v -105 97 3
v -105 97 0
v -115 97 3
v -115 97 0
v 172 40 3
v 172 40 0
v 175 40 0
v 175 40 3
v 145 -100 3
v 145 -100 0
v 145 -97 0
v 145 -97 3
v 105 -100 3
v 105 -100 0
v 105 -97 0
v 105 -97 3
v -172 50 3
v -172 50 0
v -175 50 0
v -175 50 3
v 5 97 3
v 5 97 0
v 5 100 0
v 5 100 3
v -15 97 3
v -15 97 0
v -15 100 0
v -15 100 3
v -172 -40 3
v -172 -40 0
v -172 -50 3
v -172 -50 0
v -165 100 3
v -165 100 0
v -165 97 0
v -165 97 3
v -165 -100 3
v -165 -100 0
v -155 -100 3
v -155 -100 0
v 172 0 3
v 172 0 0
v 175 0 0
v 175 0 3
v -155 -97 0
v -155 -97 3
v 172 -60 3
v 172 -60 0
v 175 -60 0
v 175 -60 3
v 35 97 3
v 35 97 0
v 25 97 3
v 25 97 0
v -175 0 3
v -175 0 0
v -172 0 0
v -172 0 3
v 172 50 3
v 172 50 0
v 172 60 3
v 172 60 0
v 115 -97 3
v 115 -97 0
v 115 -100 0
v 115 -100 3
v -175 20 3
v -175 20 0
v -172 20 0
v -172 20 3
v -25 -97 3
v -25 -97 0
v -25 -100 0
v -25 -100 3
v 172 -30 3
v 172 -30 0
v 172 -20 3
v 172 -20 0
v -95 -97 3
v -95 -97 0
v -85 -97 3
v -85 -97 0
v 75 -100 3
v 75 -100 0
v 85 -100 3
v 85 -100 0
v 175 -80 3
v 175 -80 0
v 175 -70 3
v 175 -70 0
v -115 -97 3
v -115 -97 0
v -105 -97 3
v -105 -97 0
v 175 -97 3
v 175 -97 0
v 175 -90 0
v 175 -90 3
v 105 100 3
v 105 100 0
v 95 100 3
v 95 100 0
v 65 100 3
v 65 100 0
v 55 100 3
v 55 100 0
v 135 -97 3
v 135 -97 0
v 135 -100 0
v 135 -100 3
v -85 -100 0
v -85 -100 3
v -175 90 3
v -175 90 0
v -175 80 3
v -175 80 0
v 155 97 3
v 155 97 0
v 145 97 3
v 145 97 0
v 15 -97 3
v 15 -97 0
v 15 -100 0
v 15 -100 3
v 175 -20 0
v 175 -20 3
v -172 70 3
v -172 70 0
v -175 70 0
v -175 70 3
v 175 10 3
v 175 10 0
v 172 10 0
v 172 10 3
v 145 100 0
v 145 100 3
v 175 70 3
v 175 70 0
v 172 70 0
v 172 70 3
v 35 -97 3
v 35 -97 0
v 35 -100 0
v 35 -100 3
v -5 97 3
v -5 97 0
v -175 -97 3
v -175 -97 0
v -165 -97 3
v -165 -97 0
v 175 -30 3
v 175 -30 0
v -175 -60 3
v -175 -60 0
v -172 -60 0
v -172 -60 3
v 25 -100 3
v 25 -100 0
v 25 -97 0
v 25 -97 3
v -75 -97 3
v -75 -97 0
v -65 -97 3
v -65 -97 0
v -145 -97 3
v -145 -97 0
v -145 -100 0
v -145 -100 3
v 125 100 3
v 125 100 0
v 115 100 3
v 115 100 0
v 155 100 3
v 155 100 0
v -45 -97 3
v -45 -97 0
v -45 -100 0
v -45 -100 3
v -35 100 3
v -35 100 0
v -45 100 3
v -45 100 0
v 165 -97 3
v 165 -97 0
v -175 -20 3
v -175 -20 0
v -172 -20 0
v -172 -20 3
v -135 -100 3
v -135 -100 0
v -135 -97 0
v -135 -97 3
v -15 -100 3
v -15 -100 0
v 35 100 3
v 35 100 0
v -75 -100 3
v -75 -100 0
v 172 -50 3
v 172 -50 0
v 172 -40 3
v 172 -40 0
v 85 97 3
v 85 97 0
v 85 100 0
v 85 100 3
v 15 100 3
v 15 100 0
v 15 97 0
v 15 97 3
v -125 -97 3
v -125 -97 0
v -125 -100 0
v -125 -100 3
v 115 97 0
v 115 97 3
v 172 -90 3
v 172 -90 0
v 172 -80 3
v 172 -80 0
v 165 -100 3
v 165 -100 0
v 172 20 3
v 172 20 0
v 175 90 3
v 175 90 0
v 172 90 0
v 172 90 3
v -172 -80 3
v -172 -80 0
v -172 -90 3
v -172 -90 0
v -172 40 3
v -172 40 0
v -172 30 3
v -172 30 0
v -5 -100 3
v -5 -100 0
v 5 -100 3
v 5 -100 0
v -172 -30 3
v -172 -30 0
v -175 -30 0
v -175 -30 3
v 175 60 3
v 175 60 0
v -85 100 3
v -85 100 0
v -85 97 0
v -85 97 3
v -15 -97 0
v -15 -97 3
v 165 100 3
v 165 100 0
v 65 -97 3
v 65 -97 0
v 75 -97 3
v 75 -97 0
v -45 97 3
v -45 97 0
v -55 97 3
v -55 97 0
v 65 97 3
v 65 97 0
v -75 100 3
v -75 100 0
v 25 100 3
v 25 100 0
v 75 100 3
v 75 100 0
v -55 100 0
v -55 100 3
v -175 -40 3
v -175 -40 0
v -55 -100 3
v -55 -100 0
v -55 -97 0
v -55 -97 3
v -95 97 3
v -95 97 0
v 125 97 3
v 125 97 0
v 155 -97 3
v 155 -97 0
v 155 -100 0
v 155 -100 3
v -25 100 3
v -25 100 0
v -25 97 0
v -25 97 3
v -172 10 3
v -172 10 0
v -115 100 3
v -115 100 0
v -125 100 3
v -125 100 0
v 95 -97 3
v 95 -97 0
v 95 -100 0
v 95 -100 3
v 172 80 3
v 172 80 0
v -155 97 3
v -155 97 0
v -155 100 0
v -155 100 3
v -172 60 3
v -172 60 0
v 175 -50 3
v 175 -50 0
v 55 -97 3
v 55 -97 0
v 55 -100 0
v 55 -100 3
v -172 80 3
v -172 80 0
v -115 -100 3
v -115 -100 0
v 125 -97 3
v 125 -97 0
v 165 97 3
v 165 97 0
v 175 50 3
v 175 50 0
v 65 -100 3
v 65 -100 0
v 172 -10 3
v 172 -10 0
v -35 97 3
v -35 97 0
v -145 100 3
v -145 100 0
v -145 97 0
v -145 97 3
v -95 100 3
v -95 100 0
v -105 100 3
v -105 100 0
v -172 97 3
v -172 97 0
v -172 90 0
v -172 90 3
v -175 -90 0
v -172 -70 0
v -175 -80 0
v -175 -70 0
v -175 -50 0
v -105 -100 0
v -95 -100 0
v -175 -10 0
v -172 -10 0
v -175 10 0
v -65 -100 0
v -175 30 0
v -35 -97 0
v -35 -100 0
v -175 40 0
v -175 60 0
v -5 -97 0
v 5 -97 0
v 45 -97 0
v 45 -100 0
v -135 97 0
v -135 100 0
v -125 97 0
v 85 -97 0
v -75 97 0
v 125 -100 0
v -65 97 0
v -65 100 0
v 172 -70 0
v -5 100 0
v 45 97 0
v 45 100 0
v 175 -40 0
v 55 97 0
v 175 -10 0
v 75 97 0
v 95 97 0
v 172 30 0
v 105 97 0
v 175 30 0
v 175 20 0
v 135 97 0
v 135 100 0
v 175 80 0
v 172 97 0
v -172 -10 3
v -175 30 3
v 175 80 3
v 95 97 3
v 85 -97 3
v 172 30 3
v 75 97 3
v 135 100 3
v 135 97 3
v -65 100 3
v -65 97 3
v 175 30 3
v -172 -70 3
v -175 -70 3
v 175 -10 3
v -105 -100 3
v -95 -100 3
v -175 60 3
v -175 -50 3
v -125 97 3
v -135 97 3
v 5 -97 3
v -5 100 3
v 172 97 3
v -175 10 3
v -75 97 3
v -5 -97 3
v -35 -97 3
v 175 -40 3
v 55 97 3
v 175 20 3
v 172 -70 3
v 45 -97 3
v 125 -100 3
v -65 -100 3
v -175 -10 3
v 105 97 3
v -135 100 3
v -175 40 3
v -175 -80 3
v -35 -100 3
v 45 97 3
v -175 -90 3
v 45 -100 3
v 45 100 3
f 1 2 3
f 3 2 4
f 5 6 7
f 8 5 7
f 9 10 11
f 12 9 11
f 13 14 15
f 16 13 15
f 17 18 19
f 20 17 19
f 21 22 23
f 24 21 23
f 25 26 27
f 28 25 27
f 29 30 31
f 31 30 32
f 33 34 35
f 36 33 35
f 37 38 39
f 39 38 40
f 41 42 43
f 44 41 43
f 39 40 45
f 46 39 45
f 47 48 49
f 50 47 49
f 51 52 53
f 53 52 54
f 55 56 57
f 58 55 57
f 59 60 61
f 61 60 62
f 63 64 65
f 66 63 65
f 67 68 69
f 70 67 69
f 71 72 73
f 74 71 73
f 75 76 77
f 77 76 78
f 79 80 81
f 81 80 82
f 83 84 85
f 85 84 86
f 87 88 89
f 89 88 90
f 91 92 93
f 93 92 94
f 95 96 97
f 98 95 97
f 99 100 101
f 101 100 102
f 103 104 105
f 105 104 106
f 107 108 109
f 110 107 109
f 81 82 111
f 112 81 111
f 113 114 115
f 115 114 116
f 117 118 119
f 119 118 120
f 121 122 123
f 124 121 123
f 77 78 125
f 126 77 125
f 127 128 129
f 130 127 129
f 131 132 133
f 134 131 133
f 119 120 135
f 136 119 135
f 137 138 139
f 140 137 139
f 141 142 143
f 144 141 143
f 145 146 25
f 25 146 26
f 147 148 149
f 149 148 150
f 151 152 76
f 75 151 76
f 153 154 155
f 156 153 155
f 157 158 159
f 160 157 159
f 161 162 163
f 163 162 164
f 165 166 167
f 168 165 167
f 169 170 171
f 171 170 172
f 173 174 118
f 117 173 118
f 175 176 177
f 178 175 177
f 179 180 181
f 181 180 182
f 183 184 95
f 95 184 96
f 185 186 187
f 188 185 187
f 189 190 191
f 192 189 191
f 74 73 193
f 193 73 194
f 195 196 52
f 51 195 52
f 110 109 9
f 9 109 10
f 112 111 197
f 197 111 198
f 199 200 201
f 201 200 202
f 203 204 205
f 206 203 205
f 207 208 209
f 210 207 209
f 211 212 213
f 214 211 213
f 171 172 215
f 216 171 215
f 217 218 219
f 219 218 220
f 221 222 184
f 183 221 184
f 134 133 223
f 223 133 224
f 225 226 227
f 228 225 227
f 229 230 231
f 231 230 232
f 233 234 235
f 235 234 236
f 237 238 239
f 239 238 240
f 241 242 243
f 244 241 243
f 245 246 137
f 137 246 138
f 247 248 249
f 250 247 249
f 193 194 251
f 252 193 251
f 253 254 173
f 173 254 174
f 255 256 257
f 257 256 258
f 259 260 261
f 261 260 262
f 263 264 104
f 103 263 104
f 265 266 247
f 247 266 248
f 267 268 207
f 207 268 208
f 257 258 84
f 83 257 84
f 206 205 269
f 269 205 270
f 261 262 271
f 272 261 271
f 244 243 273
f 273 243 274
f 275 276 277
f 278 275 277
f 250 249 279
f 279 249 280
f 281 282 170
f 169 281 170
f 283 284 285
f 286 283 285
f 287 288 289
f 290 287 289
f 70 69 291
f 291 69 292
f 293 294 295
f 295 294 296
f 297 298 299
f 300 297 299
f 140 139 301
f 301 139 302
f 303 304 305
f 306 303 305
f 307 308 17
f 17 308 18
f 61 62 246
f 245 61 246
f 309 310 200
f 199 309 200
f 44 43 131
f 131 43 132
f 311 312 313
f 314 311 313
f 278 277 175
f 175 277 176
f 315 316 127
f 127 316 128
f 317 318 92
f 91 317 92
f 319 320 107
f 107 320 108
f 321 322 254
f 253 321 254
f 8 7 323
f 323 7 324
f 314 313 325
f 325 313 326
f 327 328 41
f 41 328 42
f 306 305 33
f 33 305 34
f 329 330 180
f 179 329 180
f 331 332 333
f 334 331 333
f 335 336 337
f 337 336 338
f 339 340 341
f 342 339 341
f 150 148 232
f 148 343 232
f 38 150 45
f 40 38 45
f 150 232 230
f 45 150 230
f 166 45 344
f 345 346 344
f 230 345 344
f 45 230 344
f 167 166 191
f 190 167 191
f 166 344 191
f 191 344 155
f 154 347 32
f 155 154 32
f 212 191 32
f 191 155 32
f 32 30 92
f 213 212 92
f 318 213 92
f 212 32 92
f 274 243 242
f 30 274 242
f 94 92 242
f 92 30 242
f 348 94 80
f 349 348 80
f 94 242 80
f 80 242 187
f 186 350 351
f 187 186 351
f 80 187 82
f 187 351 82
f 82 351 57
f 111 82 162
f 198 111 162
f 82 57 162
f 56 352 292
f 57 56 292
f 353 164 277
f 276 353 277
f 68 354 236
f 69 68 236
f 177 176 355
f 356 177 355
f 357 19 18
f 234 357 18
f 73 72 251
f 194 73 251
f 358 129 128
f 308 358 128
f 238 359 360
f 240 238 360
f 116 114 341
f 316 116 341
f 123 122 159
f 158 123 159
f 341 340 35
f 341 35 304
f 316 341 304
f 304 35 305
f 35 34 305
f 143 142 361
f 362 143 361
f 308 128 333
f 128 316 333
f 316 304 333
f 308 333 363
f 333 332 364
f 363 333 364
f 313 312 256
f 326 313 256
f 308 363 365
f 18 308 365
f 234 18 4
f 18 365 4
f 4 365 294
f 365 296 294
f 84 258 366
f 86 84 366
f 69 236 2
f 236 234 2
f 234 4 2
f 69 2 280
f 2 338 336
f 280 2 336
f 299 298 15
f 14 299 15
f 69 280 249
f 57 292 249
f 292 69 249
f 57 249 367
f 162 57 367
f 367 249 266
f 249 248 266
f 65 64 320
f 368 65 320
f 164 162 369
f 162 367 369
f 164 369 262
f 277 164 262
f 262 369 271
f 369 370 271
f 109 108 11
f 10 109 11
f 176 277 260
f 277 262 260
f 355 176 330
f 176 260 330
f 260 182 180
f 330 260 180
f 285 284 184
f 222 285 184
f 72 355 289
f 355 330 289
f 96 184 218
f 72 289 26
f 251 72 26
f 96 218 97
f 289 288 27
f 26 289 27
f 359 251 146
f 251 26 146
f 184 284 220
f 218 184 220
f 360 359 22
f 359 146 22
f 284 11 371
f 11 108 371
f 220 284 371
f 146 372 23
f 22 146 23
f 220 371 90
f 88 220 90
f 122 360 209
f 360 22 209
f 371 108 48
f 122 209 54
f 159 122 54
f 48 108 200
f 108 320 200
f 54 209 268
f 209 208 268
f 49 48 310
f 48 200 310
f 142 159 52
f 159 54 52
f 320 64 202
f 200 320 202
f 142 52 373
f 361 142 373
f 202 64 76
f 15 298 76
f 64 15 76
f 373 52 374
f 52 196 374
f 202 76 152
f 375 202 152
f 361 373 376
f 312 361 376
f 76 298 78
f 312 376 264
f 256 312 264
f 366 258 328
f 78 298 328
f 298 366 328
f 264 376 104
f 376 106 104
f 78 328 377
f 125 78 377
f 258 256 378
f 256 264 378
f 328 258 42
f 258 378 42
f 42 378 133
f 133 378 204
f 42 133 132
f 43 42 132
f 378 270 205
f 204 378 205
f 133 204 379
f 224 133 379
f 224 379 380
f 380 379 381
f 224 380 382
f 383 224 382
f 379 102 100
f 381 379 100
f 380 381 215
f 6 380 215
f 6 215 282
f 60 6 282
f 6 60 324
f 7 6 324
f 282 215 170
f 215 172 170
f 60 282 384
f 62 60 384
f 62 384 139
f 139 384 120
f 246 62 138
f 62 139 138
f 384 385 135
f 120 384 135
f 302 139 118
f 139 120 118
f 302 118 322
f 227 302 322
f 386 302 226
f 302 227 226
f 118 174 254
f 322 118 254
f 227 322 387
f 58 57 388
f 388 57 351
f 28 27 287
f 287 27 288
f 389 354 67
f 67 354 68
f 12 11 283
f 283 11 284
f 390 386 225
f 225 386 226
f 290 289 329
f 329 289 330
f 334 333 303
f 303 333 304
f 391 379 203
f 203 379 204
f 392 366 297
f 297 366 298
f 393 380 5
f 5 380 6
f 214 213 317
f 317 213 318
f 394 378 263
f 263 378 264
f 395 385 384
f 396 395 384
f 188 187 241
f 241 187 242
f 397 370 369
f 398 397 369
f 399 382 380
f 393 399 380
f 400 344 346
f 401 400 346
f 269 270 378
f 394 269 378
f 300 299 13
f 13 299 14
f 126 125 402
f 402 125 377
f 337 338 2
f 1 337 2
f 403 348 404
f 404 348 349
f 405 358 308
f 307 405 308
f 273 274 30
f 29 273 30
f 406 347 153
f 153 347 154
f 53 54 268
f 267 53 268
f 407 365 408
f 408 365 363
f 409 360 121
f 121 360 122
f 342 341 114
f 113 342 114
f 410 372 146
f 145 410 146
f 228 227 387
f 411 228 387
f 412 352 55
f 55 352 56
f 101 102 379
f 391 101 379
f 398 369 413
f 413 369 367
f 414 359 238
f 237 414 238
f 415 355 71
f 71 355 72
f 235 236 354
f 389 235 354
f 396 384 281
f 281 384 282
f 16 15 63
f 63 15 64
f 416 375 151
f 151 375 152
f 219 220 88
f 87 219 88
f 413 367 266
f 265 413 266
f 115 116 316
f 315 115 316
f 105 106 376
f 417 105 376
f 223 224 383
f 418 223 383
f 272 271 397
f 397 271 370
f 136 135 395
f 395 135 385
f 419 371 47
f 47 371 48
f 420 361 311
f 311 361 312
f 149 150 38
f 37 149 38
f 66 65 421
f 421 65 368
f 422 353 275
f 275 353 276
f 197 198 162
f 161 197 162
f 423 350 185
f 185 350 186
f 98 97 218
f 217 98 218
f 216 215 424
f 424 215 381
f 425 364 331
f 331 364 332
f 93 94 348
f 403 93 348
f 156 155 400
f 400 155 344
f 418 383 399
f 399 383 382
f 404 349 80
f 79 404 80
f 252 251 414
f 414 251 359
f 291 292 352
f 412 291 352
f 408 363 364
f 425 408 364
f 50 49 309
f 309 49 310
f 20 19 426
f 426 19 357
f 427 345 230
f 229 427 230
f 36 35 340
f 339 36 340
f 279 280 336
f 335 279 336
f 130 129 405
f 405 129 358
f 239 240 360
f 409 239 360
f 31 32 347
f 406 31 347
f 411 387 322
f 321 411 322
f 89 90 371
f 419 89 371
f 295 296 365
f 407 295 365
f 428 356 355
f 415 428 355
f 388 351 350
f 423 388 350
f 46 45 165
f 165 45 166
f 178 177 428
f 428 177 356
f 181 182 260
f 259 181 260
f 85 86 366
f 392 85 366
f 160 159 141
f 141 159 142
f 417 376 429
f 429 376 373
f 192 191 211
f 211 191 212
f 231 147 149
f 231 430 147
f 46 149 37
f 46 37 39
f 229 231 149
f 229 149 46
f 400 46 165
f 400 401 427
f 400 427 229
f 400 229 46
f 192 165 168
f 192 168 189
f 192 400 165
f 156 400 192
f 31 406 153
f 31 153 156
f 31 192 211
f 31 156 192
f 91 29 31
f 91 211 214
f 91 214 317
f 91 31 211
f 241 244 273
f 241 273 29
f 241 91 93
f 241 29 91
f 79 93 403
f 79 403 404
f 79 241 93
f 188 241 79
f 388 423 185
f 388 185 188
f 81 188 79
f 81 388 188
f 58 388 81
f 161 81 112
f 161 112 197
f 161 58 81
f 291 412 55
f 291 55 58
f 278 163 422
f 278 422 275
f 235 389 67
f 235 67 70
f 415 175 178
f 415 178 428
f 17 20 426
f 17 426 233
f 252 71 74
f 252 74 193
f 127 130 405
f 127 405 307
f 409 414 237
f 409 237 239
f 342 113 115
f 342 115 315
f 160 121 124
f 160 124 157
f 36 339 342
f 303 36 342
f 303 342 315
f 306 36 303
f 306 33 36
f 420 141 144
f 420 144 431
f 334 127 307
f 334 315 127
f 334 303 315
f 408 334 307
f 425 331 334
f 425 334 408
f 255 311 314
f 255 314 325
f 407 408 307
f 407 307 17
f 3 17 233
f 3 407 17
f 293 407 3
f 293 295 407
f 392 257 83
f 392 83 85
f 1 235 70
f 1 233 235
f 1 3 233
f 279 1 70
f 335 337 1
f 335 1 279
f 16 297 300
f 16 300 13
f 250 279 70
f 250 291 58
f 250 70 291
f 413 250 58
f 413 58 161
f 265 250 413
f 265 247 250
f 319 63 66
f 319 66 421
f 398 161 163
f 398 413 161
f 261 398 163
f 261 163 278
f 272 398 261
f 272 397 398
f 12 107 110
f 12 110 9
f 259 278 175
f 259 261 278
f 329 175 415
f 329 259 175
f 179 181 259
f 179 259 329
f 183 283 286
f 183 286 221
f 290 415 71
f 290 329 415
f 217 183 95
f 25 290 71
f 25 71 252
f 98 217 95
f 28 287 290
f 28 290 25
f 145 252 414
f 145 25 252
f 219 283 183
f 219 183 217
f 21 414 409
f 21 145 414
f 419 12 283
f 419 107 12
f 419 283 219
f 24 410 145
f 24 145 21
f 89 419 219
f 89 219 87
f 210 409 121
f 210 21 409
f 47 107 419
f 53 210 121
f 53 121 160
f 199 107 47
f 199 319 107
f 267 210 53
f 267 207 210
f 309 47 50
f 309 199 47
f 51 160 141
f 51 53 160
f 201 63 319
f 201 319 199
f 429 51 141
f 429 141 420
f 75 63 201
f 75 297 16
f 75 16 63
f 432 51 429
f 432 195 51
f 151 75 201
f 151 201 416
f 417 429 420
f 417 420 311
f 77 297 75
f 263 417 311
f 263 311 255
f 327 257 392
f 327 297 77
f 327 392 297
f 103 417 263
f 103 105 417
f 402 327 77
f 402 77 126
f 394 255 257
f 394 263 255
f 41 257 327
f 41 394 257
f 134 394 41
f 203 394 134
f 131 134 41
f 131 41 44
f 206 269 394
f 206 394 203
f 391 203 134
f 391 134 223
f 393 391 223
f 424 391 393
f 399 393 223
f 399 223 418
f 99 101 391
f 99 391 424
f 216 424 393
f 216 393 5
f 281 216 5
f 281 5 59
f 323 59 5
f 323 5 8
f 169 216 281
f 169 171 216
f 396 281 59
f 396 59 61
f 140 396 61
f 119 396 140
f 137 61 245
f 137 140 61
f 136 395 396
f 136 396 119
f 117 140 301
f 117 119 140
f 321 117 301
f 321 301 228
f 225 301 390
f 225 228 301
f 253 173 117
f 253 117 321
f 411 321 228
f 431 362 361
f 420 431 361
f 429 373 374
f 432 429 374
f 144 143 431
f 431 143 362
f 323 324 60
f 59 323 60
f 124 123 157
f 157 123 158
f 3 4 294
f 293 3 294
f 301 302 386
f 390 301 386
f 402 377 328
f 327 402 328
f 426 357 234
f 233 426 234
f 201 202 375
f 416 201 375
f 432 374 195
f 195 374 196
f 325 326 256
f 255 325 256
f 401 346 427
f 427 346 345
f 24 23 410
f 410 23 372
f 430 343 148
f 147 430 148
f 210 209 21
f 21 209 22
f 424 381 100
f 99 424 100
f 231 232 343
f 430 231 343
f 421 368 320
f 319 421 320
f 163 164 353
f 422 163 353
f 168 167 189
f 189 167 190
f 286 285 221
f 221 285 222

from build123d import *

# Parameters (mm, degrees)
SALIENTE_EXTRUIR1_DEPTH = 3


with BuildPart() as part:
    # Croquis1 → Saliente-Extruir1 (new body)
    with BuildSketch(Plane.XY):
        Polygon((-175, -97), (-165, -97), (-165, -100), (-155, -100), (-155, -97), (-145, -97), (-145, -100), (-135, -100), (-135, -97), (-125, -97), (-125, -100), (-115, -100), (-115, -97), (-105, -97), (-105, -100), (-95, -100), (-95, -97), (-85, -97), (-85, -100), (-75, -100), (-75, -97), (-65, -97), (-65, -100), (-55, -100), (-55, -97), (-45, -97), (-45, -100), (-35, -100), (-35, -97), (-25, -97), (-25, -100), (-15, -100), (-15, -97), (-5, -97), (-5, -100), (5, -100), (5, -97), (15, -97), (15, -100), (25, -100), (25, -97), (35, -97), (35, -100), (45, -100), (45, -97), (55, -97), (55, -100), (65, -100), (65, -97), (75, -97), (75, -100), (85, -100), (85, -97), (95, -97), (95, -100), (105, -100), (105, -97), (115, -97), (115, -100), (125, -100), (125, -97), (135, -97), (135, -100), (145, -100), (145, -97), (155, -97), (155, -100), (165, -100), (165, -97), (175, -97), (175, -90), (172, -90), (172, -80), (175, -80), (175, -70), (172, -70), (172, -60), (175, -60), (175, -50), (172, -50), (172, -40), (175, -40), (175, -30), (172, -30), (172, -20), (175, -20), (175, -10), (172, -10), (172, 0), (175, 0), (175, 10), (172, 10), (172, 20), (175, 20), (175, 30), (172, 30), (172, 40), (175, 40), (175, 50), (172, 50), (172, 60), (175, 60), (175, 70), (172, 70), (172, 80), (175, 80), (175, 90), (172, 90), (172, 97), (165, 97), (165, 100), (155, 100), (155, 97), (145, 97), (145, 100), (135, 100), (135, 97), (125, 97), (125, 100), (115, 100), (115, 97), (105, 97), (105, 100), (95, 100), (95, 97), (85, 97), (85, 100), (75, 100), (75, 97), (65, 97), (65, 100), (55, 100), (55, 97), (45, 97), (45, 100), (35, 100), (35, 97), (25, 97), (25, 100), (15, 100), (15, 97), (5, 97), (5, 100), (-5, 100), (-5, 97), (-15, 97), (-15, 100), (-25, 100), (-25, 97), (-35, 97), (-35, 100), (-45, 100), (-45, 97), (-55, 97), (-55, 100), (-65, 100), (-65, 97), (-75, 97), (-75, 100), (-85, 100), (-85, 97), (-95, 97), (-95, 100), (-105, 100), (-105, 97), (-115, 97), (-115, 100), (-125, 100), (-125, 97), (-135, 97), (-135, 100), (-145, 100), (-145, 97), (-155, 97), (-155, 100), (-165, 100), (-165, 97), (-172, 97), (-172, 90), (-175, 90), (-175, 80), (-172, 80), (-172, 70), (-175, 70), (-175, 60), (-172, 60), (-172, 50), (-175, 50), (-175, 40), (-172, 40), (-172, 30), (-175, 30), (-175, 20), (-172, 20), (-172, 10), (-175, 10), (-175, 0), (-172, 0), (-172, -10), (-175, -10), (-175, -20), (-172, -20), (-172, -30), (-175, -30), (-175, -40), (-172, -40), (-172, -50), (-175, -50), (-175, -60), (-172, -60), (-172, -70), (-175, -70), (-175, -80), (-172, -80), (-172, -90), (-175, -90), align=None)
    extrude(amount=SALIENTE_EXTRUIR1_DEPTH)


solid = part.part
